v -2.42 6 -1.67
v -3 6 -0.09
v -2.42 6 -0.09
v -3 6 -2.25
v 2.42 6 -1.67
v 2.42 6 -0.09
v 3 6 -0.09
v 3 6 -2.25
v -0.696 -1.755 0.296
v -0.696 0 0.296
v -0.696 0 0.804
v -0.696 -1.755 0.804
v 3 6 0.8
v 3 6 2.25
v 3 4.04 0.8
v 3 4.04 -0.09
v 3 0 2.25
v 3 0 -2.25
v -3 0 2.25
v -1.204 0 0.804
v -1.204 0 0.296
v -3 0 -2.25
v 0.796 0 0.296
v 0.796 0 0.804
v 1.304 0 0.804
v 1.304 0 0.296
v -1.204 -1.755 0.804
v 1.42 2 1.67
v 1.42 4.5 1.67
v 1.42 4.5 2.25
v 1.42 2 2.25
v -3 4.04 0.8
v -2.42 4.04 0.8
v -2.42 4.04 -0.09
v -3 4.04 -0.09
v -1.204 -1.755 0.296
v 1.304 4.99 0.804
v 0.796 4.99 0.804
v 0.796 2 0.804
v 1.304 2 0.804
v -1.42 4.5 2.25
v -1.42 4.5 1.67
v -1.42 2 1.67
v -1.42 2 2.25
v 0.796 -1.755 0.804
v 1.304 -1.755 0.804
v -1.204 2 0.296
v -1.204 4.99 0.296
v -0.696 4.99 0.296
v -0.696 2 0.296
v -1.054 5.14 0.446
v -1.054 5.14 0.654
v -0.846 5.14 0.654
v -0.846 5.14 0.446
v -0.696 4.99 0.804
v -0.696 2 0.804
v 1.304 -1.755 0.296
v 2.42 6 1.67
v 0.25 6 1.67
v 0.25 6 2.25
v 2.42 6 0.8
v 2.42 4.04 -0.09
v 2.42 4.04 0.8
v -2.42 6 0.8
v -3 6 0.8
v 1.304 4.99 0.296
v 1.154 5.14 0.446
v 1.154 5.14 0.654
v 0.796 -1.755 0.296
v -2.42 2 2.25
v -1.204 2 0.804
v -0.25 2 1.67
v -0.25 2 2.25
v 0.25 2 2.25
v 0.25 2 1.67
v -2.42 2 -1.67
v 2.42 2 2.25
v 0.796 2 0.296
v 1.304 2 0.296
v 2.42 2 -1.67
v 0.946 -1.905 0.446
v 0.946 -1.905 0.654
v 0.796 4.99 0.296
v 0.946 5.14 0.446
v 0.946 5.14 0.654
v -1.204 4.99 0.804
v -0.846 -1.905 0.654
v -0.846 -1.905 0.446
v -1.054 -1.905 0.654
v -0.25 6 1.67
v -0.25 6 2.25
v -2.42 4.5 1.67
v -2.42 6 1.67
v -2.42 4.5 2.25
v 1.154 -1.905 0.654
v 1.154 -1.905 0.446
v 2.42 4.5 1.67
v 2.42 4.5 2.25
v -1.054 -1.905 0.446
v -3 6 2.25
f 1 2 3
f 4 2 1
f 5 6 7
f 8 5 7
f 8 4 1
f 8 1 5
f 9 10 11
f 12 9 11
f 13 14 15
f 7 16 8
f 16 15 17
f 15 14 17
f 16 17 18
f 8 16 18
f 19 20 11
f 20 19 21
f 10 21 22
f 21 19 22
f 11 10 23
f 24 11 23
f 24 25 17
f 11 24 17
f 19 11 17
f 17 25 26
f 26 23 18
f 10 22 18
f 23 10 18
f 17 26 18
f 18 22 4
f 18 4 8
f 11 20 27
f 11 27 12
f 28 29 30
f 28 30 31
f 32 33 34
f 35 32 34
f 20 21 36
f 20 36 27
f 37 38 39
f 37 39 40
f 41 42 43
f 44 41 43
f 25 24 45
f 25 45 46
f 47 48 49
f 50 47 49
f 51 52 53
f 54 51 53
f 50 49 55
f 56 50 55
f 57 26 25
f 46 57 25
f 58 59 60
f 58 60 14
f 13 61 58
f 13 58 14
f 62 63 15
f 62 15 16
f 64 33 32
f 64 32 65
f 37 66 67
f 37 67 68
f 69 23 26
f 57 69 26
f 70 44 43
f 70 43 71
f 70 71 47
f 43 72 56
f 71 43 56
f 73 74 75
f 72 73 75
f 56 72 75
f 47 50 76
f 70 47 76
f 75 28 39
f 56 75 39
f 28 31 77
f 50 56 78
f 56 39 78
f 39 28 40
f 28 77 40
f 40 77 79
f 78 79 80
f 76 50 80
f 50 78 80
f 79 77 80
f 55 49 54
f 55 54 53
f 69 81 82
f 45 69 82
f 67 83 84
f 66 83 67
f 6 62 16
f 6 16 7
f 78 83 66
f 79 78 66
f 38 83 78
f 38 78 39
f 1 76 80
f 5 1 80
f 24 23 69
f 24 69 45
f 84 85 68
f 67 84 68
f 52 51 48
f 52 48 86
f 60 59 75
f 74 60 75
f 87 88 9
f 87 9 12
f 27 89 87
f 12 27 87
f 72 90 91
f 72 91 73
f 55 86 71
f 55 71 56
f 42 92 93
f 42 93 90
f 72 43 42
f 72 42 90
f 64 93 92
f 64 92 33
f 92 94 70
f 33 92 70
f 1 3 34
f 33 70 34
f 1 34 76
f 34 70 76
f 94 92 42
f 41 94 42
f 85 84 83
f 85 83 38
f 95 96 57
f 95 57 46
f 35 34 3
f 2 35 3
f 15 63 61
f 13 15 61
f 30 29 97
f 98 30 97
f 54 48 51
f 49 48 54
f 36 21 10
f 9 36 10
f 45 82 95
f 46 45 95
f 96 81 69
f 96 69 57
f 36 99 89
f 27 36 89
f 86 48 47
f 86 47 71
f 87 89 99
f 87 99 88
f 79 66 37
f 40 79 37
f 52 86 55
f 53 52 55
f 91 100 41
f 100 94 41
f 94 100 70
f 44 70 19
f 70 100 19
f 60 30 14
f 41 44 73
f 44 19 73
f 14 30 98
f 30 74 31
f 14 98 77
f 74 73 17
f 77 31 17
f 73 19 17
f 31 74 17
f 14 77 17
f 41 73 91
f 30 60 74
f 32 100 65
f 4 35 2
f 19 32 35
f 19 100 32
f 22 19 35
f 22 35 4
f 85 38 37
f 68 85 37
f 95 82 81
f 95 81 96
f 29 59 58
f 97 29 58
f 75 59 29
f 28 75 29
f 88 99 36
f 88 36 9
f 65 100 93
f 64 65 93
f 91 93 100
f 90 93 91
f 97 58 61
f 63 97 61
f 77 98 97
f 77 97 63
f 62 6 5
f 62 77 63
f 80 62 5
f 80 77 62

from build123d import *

# Parameters (mm, degrees)
SKETCH4_W                          = 6
SKETCH4_H                          = 4.5
BODY_EXTRUDE2_DEPTH                = 6
BODY_SHELL1_T                      = -0.58
BODY_SHELL1_THICKNESS_2_FACE_W     = 3.34
BODY_SHELL1_THICKNESS_2_FACE_H     = 4.84
BODY_SHELL1_THICKNESS_2_DEPTH      = 1.42
EXTRUDE3_REACH                     = 9.075
SKETCH66_W                         = 0.89
SKETCH66_H                         = 1.96
EXTRUDE3_DIRECTION_2_REACH         = 9.075
EXTRUDE2_REACH                     = 9.77
SKETCH65_W                         = 0.5
SKETCH65_H                         = 4
SKETCH65_W_2                       = 1
SKETCH65_H_2                       = 2.5
SKETCH64_W                         = 0.508
SKETCH64_H                         = 0.508
PINS_EXTRUDE_DEPTH                 = 7.045
PINS_CHAMFER_SIZE                  = 0.15
PINS_LPATTERN_COUNT                = 2
PINS_LPATTERN_PITCH                = 2
PINS_CHAMFER_OF_PINS_LPATTERN_SIZE = 0.15


with BuildPart() as part:
    # Sketch4 → Body-Extrude2 (new body)
    with BuildSketch(Plane(origin=(6.86422654, 0, 1.863703399), x_dir=(1, 0, 0), z_dir=(0, 1, 0))):
        with Locations((-6.86422654, 1.863703399)):
            Rectangle(SKETCH4_W, SKETCH4_H)
    extrude(amount=BODY_EXTRUDE2_DEPTH)

    # Body-Shell1
    body_shell1_openings = [part.faces().sort_by_distance(p)[0] for p in [
        (0, 6, 0),
    ]]
    offset(amount=BODY_SHELL1_T, openings=body_shell1_openings, kind=Kind.INTERSECTION)

    # Body-Shell1 thickness 2 face (on inner face of the shell) → Body-Shell1 thickness 2 (add)
    with BuildSketch(Plane(origin=(0, 0.58, 0), x_dir=(0, 0, -1), z_dir=(0, -1, 0))):
        Rectangle(BODY_SHELL1_THICKNESS_2_FACE_W, BODY_SHELL1_THICKNESS_2_FACE_H)
    extrude(amount=-BODY_SHELL1_THICKNESS_2_DEPTH)

    # Extrude3: up to this face of the body (flat: up to its plane)
    extrude3_end = Plane(part.part.faces().sort_by_distance((-3, 3, 0))[0])
    # Sketch66 → Extrude3 (cut, up to the picked face)
    with BuildSketch(Plane(origin=(0, 0, 0), x_dir=(0, 0, -1), z_dir=(1, 0, 0)), mode=Mode.PRIVATE) as extrude3_sk1:
        with Locations((-0.355, 5.02)):
            Rectangle(SKETCH66_W, SKETCH66_H)
    extrude3_tool1 = split(extrude(extrude3_sk1.sketch, amount=-EXTRUDE3_REACH, mode=Mode.PRIVATE), bisect_by=extrude3_end, keep=Keep.BOTH, mode=Mode.PRIVATE)
    add(extrude3_tool1.solids().sort_by(Axis((0, 5.02, 0.355), (-1, 0, 0)))[0], mode=Mode.SUBTRACT)

    # Extrude3 direction 2: up to this face of the body (flat: up to its plane)
    extrude3_direction_2_end = Plane(part.part.faces().sort_by_distance((3, 3, 0))[0])
    # Sketch66 → Extrude3 direction 2 (cut, up to the picked face)
    with BuildSketch(Plane(origin=(0, 0, 0), x_dir=(0, 0, -1), z_dir=(1, 0, 0)), mode=Mode.PRIVATE) as extrude3_direction_2_sk1:
        with Locations((-0.355, 5.02)):
            Rectangle(SKETCH66_W, SKETCH66_H)
    extrude3_direction_2_tool1 = split(extrude(extrude3_direction_2_sk1.sketch, amount=EXTRUDE3_DIRECTION_2_REACH, mode=Mode.PRIVATE), bisect_by=extrude3_direction_2_end, keep=Keep.BOTH, mode=Mode.PRIVATE)
    add(extrude3_direction_2_tool1.solids().sort_by(Axis((0, 5.02, 0.355), (1, 0, 0)))[0], mode=Mode.SUBTRACT)

    # Sketch65 → Extrude2 (cut, up to next)
    with BuildSketch(Plane(origin=(0, 0, 1.67), x_dir=(1, 0, 0), z_dir=(0, 0, -1)), mode=Mode.PRIVATE) as extrude2_sk1:
        with Locations((0, -4)):
            Rectangle(SKETCH65_W, SKETCH65_H)
    extrude2_tool1 = extrude(extrude2_sk1.sketch, amount=-EXTRUDE2_REACH, mode=Mode.PRIVATE) & part.part
    # Sketch65 → Extrude2 (cut, up to next)
    with BuildSketch(Plane(origin=(0, 0, 1.67), x_dir=(1, 0, 0), z_dir=(0, 0, -1)), mode=Mode.PRIVATE) as extrude2_sk2:
        with Locations((-1.92, -3.25)):
            Rectangle(SKETCH65_W_2, SKETCH65_H_2)
    extrude2_tool2 = extrude(extrude2_sk2.sketch, amount=-EXTRUDE2_REACH, mode=Mode.PRIVATE) & part.part
    # Sketch65 → Extrude2 (cut, up to next)
    with BuildSketch(Plane(origin=(0, 0, 1.67), x_dir=(1, 0, 0), z_dir=(0, 0, -1)), mode=Mode.PRIVATE) as extrude2_sk3:
        with Locations((1.92, -3.25)):
            Rectangle(SKETCH65_W_2, SKETCH65_H_2)
    extrude2_tool3 = extrude(extrude2_sk3.sketch, amount=-EXTRUDE2_REACH, mode=Mode.PRIVATE) & part.part
    add(extrude2_tool1.solids().sort_by_distance((0, 4, 1.67))[0], mode=Mode.SUBTRACT)
    add(extrude2_tool2.solids().sort_by_distance((-1.92, 3.25, 1.67))[0], mode=Mode.SUBTRACT)
    add(extrude2_tool3.solids().sort_by_distance((1.92, 3.25, 1.67))[0], mode=Mode.SUBTRACT)

    # Sketch64 → Pins-Extrude (add)
    with BuildSketch(Plane(origin=(0, 5.14, -3.64), x_dir=(1, 0, 0), z_dir=(0, -1, 0))):
        with Locations((1.05, 4.19)):
            Rectangle(SKETCH64_W, SKETCH64_H)
    pins_extrude = extrude(amount=PINS_EXTRUDE_DEPTH)

    # Pins-Chamfer
    pins_chamfer_edges = [part.edges().sort_by_distance(p)[0] for p in [
        (0.796, 5.14, 0.55),
        (1.05, 5.14, 0.296),
        (1.304, 5.14, 0.55),
        (1.05, 5.14, 0.804),
        (1.05, -1.905, 0.804),
        (0.796, -1.905, 0.55),
        (1.05, -1.905, 0.296),
        (1.304, -1.905, 0.55),
    ]]
    chamfer(pins_chamfer_edges, length=PINS_CHAMFER_SIZE)

    # Pins-LPattern: Pins-Extrude ×2
    with Locations(*[(-i * PINS_LPATTERN_PITCH, 0, 0) for i in range(1, PINS_LPATTERN_COUNT)]):
        add(pins_extrude)

    # Pins-Chamfer of Pins-LPattern
    pins_chamfer_of_pins_lpattern_edges = [part.edges().sort_by_distance(p)[0] for p in [
        (-1.204, 5.14, 0.55),
        (-0.95, 5.14, 0.296),
        (-0.696, 5.14, 0.55),
        (-0.95, 5.14, 0.804),
        (-0.95, -1.905, 0.804),
        (-1.204, -1.905, 0.55),
        (-0.95, -1.905, 0.296),
        (-0.696, -1.905, 0.55),
    ]]
    chamfer(pins_chamfer_of_pins_lpattern_edges, length=PINS_CHAMFER_OF_PINS_LPATTERN_SIZE)


solid = part.part
